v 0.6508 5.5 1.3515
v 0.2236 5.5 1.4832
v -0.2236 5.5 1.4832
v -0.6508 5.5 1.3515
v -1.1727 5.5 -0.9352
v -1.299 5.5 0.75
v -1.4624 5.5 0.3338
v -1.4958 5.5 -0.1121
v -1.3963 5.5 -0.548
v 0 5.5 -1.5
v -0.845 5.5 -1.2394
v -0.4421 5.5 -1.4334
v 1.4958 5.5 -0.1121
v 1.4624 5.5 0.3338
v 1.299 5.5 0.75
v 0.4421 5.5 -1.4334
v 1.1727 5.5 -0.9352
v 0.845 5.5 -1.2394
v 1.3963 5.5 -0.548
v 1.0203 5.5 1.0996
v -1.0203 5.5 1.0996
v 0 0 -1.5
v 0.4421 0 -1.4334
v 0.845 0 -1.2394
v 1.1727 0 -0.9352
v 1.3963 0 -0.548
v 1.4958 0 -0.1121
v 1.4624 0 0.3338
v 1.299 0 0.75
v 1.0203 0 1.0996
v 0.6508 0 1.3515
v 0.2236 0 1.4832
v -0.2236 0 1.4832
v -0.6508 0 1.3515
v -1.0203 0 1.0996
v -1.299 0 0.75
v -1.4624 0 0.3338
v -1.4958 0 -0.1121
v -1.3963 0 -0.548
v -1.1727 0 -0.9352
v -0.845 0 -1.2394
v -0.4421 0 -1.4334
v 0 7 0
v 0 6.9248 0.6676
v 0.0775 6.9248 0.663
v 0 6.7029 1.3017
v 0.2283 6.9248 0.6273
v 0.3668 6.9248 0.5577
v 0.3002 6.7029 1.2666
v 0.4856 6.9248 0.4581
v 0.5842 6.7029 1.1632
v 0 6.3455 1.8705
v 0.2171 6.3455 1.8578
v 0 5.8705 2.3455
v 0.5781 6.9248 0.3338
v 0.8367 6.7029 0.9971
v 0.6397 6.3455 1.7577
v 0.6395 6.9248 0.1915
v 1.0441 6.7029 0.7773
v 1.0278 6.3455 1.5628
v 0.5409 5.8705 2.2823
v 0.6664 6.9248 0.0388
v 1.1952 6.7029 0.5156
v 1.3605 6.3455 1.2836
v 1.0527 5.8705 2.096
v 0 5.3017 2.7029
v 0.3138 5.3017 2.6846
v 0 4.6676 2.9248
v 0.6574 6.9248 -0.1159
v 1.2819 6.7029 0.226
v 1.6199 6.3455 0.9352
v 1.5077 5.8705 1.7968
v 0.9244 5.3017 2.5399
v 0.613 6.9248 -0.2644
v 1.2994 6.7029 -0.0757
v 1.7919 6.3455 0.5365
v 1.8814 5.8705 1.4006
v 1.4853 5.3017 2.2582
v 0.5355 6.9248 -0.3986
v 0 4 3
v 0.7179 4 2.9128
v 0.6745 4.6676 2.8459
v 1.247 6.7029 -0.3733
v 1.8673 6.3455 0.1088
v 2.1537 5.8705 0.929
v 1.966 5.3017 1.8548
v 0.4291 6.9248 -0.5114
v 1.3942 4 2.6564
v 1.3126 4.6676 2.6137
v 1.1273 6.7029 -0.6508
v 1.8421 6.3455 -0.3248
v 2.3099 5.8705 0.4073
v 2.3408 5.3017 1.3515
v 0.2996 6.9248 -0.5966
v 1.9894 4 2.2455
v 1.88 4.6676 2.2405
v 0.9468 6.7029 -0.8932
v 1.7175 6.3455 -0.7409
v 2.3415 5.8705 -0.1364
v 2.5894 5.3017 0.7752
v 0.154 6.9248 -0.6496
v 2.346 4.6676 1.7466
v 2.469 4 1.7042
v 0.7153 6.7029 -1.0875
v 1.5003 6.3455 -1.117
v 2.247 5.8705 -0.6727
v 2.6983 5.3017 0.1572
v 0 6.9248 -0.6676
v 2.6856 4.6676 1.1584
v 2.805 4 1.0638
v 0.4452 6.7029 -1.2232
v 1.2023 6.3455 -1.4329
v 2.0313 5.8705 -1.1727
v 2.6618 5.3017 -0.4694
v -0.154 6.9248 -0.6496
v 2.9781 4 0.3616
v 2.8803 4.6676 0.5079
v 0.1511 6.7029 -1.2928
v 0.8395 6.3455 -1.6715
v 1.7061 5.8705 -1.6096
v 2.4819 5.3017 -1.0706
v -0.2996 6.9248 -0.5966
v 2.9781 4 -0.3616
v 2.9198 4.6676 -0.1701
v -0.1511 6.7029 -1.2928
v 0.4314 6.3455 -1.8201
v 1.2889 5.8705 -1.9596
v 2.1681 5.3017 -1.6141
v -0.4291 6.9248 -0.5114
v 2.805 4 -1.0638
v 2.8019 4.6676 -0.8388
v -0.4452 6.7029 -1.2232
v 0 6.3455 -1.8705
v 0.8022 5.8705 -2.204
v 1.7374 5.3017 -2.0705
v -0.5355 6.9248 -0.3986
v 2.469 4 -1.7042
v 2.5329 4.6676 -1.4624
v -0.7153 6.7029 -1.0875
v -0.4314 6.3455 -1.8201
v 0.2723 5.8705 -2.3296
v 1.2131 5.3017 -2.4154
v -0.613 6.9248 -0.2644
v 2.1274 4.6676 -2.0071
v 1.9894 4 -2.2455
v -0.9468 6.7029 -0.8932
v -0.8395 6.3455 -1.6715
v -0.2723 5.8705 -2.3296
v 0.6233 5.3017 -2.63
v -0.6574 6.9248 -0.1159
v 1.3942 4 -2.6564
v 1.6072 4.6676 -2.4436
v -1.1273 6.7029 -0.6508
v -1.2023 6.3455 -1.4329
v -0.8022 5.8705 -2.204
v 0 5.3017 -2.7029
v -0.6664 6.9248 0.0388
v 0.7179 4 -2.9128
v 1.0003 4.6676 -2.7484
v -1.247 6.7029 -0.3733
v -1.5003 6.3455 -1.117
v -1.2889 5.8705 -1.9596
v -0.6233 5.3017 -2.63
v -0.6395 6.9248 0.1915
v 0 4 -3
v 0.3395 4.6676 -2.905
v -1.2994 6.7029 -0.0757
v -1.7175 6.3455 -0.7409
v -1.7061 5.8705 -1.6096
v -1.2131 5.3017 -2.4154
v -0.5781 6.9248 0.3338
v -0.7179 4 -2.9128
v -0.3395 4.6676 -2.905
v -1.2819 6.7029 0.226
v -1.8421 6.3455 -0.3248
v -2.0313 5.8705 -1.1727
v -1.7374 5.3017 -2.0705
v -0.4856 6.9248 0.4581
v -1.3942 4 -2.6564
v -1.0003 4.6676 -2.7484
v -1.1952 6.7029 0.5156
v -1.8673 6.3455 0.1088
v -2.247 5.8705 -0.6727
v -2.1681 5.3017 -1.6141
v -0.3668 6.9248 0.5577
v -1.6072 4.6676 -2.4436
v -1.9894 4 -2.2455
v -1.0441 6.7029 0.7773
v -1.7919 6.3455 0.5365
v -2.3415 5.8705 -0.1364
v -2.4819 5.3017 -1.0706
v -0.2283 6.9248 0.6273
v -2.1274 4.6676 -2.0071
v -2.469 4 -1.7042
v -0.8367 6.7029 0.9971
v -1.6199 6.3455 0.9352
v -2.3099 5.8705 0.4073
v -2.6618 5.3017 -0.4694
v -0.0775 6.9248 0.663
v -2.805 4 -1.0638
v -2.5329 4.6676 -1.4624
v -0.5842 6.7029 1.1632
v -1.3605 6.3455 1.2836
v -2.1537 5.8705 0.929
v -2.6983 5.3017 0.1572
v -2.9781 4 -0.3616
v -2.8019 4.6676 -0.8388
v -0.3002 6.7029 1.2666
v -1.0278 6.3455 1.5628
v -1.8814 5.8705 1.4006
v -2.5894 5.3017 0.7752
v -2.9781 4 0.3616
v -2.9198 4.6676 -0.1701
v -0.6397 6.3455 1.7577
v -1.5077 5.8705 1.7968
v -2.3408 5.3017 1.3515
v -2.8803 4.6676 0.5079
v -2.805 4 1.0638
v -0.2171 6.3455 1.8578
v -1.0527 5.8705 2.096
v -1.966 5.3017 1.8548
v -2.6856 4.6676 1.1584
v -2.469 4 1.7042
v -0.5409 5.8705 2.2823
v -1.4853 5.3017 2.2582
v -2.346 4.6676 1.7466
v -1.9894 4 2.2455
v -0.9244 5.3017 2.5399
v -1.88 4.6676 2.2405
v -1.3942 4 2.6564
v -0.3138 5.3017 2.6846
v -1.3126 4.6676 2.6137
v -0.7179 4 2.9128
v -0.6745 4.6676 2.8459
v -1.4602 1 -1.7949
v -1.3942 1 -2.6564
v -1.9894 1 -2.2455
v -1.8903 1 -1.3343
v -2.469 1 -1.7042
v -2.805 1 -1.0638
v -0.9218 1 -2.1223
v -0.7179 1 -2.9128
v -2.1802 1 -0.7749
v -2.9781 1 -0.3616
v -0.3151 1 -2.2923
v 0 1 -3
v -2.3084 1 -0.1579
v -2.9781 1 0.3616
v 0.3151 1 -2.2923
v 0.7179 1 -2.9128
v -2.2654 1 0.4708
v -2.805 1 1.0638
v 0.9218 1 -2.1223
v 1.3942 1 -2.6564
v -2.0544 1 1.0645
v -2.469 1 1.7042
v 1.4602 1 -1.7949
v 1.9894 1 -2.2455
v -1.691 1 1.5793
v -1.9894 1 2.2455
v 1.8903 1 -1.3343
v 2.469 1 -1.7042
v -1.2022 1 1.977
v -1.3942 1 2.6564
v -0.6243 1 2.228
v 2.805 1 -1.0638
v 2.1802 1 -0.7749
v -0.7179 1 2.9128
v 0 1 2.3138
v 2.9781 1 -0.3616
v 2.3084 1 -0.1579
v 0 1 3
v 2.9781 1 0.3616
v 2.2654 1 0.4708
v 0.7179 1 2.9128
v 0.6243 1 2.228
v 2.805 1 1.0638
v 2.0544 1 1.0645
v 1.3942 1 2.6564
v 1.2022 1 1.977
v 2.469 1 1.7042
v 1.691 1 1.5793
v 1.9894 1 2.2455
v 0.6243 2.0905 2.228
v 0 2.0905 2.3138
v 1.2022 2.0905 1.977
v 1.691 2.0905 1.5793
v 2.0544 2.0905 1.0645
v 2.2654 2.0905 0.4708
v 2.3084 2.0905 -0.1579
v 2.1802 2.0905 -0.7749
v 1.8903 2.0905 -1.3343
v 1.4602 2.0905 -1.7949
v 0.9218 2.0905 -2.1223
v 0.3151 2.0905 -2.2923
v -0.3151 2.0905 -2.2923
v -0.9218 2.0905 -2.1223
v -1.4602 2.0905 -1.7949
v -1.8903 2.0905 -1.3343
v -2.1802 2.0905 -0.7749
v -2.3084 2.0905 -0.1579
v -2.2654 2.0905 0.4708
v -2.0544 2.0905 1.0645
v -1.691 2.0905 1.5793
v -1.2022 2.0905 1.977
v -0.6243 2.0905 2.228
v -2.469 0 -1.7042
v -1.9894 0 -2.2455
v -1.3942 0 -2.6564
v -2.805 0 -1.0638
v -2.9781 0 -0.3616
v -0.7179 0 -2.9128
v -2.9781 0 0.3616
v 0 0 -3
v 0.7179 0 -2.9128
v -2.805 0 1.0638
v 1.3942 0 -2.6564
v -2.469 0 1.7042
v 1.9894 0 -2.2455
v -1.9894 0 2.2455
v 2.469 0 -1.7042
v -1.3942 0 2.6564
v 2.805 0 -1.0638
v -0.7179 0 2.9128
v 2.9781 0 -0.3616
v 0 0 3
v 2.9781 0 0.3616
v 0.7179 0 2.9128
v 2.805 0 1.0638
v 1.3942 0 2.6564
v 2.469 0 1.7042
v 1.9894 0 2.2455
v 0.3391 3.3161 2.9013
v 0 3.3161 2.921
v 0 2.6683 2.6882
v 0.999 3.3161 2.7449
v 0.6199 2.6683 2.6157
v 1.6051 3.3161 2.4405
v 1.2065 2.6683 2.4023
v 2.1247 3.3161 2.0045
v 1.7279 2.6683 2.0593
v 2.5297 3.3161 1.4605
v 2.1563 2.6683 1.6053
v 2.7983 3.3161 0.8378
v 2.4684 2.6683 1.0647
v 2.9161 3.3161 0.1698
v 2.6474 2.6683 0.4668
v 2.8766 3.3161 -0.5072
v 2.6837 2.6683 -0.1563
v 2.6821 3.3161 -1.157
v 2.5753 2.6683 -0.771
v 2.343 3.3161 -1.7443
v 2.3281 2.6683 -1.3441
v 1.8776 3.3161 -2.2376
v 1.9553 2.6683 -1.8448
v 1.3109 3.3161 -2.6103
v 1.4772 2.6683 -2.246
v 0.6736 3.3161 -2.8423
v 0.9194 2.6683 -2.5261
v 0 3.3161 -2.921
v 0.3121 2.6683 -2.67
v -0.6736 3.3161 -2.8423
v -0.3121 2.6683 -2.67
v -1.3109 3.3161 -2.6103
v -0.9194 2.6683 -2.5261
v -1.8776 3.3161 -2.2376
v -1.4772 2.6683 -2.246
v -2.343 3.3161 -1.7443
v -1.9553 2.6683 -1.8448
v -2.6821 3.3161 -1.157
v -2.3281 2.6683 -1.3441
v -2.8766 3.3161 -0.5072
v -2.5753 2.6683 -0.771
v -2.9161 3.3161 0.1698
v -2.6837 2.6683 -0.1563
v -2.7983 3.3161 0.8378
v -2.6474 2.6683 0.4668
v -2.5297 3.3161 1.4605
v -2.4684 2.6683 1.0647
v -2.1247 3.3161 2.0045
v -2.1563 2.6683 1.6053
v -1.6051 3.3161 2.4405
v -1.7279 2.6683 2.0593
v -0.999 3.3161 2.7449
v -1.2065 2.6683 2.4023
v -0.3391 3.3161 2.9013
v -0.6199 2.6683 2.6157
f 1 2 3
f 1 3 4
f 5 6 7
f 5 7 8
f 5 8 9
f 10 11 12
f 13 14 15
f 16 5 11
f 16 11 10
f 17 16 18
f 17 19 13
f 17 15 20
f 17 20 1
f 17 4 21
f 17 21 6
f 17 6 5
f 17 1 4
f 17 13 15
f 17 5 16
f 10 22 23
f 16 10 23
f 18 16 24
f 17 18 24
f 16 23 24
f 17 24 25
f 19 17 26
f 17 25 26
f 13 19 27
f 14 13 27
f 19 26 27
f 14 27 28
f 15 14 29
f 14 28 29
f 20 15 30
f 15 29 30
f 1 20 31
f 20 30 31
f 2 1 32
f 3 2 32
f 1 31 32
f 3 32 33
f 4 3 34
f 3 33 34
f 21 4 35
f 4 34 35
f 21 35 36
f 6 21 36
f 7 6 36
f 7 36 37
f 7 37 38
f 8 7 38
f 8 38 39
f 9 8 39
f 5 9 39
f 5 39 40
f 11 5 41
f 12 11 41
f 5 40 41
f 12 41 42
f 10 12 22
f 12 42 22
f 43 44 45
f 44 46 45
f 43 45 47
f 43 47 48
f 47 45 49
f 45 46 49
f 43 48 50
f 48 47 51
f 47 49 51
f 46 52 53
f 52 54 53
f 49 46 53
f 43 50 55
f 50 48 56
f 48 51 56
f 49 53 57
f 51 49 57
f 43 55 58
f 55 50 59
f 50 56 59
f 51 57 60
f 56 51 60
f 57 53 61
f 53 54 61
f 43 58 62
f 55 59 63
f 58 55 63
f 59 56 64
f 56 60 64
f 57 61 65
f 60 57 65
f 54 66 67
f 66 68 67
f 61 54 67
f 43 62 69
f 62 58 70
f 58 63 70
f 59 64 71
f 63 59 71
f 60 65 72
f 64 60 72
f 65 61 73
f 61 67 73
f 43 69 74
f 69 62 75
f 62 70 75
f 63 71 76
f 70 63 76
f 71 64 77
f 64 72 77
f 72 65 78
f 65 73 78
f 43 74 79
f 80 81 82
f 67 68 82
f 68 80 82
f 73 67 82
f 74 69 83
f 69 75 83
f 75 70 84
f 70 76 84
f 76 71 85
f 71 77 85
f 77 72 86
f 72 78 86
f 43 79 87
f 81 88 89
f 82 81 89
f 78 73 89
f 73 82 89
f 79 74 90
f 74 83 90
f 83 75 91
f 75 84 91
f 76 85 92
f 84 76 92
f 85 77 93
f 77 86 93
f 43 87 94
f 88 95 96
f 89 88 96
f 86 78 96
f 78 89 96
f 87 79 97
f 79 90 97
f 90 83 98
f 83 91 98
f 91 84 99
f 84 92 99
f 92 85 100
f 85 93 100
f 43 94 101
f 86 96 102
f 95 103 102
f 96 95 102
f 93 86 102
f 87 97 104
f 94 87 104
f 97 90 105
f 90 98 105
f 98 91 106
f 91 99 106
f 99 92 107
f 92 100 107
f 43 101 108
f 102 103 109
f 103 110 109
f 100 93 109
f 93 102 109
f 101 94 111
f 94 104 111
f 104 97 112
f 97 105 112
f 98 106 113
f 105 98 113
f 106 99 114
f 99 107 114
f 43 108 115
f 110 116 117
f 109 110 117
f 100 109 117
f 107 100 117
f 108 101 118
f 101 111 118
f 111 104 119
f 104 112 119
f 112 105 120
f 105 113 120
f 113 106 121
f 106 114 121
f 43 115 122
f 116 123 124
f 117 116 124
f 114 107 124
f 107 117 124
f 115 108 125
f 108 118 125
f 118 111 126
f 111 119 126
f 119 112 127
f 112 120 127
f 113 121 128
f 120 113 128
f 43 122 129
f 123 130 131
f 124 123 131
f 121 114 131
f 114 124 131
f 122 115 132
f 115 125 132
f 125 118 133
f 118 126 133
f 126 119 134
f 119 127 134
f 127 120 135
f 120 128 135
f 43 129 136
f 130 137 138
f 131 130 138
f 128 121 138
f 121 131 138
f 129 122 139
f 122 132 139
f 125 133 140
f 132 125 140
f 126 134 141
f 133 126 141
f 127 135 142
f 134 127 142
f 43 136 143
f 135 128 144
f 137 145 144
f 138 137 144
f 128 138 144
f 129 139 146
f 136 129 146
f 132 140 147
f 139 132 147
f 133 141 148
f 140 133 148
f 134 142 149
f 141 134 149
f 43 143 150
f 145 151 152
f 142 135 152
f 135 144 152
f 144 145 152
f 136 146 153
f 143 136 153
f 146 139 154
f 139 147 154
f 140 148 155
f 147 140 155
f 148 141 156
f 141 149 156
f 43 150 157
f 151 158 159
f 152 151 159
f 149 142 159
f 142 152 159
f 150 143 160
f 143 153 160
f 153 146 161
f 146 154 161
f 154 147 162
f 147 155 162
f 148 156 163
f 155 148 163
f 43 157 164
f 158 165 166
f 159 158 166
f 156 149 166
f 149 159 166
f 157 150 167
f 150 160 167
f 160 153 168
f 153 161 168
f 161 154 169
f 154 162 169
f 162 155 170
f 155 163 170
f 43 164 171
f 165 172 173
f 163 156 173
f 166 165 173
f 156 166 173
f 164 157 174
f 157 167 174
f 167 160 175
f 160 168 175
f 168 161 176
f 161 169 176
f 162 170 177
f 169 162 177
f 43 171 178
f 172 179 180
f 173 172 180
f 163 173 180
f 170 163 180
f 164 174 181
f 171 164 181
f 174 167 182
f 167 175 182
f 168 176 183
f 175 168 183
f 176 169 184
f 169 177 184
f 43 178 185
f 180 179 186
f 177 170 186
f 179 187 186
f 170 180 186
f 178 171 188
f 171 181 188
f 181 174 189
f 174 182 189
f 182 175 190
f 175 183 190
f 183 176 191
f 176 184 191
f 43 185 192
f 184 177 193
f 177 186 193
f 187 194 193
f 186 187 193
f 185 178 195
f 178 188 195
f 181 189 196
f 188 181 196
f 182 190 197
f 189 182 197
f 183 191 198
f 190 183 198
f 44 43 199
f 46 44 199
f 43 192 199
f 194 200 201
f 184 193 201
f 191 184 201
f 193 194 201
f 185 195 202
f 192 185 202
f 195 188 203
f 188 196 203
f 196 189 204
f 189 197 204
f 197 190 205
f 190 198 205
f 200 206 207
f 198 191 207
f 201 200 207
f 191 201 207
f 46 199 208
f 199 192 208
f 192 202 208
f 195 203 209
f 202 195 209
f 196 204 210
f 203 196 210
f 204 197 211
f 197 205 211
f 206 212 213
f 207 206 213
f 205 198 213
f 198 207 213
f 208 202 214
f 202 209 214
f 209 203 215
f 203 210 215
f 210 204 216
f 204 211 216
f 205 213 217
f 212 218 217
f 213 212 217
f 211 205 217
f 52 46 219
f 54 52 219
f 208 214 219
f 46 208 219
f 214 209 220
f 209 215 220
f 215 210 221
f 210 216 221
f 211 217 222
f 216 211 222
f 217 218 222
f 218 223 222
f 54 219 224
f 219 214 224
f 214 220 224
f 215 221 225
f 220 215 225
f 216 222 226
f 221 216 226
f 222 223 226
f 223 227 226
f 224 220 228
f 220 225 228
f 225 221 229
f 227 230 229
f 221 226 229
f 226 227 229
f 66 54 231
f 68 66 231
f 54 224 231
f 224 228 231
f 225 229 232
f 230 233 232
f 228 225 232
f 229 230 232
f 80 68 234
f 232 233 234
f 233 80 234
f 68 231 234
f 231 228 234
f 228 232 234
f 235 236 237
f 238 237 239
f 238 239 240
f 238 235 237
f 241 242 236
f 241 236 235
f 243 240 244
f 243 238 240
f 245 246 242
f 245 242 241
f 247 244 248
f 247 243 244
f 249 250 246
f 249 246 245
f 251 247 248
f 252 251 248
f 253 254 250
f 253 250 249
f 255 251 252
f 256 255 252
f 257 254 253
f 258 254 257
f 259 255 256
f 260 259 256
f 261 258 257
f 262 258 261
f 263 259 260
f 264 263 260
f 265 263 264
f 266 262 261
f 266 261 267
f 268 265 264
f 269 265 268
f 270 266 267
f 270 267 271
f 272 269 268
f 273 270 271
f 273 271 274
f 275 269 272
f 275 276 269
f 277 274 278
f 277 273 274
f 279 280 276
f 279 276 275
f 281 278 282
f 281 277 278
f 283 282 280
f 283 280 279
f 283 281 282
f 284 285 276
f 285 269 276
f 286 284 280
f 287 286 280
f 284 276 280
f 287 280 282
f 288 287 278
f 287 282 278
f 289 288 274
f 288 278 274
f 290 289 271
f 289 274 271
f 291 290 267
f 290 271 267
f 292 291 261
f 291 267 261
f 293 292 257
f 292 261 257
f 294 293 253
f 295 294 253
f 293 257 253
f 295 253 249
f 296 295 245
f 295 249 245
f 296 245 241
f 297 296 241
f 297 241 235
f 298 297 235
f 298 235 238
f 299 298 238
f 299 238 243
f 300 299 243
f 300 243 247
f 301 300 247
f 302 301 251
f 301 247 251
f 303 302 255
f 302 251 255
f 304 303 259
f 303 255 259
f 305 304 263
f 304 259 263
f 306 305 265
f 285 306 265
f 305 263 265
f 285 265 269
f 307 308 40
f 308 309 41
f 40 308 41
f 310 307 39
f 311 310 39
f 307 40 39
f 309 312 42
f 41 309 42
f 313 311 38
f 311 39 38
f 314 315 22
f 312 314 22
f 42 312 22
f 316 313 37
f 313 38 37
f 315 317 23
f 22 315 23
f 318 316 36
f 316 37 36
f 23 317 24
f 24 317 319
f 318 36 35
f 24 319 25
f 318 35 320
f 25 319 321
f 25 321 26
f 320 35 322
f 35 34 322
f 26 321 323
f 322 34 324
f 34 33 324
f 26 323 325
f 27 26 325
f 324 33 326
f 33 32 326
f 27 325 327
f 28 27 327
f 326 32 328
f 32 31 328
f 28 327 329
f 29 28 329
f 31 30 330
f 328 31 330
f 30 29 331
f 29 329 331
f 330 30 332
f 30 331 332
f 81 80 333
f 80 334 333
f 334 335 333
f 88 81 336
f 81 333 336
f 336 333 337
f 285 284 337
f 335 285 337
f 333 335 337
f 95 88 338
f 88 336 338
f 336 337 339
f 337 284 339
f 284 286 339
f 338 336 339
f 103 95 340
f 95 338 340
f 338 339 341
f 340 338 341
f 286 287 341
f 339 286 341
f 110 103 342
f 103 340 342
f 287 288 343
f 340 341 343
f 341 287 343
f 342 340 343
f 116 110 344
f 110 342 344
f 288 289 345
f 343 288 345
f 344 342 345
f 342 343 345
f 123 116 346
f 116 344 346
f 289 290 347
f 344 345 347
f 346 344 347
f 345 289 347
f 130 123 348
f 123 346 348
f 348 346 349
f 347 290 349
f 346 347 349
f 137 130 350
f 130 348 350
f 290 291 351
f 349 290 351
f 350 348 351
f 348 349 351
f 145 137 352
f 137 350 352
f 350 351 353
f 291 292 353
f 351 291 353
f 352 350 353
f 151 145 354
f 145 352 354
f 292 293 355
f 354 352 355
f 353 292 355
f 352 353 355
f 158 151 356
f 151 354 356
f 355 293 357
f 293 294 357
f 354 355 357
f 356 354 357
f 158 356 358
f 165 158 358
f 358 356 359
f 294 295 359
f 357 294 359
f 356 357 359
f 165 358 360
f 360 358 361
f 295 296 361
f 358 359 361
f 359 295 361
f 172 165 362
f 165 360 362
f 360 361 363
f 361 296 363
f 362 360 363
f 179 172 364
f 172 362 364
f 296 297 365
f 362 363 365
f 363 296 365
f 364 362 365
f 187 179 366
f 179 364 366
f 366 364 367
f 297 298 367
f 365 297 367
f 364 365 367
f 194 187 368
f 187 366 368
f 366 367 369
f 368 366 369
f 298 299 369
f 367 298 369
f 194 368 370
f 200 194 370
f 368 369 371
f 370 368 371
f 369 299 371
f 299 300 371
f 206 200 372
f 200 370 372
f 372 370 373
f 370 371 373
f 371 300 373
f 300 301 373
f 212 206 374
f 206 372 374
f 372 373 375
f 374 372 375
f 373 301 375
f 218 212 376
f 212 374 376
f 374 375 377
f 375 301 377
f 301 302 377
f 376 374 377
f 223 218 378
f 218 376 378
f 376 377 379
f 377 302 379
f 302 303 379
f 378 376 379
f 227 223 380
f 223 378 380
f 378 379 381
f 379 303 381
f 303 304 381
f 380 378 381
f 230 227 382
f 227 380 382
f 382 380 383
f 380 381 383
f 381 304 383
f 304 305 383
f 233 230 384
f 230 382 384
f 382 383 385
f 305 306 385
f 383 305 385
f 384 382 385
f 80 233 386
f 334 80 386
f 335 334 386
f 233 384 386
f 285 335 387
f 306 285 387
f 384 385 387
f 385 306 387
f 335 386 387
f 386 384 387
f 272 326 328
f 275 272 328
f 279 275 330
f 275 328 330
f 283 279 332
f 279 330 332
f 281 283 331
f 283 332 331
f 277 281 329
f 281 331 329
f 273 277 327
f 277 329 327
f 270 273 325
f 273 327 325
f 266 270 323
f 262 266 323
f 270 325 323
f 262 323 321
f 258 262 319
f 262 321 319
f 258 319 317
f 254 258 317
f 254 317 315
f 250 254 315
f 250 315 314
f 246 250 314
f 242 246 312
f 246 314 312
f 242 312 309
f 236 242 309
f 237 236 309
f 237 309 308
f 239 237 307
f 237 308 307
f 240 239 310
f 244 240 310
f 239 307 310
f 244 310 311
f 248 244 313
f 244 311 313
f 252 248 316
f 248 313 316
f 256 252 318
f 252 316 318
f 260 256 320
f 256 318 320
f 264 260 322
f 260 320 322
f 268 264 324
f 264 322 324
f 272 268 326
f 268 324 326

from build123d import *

# Parameters (mm, degrees)
SKETCH1_R           = 3
BOSS_EXTRUDE1_DEPTH = 1
SKETCH4_R           = 1.5
CUT_EXTRUDE1_DEPTH  = 5.5


with BuildPart() as part:
    # Sketch1 → Boss-Extrude1 (new body)
    with BuildSketch(Plane(origin=(0, 0, 0), x_dir=(1, 0, 0), z_dir=(0, 1, 0))):
        with Locations(Location((0, 0, 0), (0, 0, 270))):
            Circle(SKETCH1_R)
    extrude(amount=BOSS_EXTRUDE1_DEPTH)

    # Sketch3 → Revolve2 (revolve)
    with BuildSketch(Plane(origin=(0, 0, 0), x_dir=(0, 0, -1), z_dir=(1, 0, 0))):
        with BuildLine():
            Line((-1.156919819, 1), (0, 1))
            Line((0, 1), (0, 4))
            Line((0, 4), (0, 7))
            ThreePointArc((0, 7), (-2.121320344, 6.121320344), (-3, 4))
            ThreePointArc((-3, 4), (-2.823253346, 2.98548507), (-2.313839638, 2.090511553))
            Line((-2.313839638, 2.090511553), (-2.313839638, 1))
            Line((-2.313839638, 1), (-1.156919819, 1))
        make_face()
    revolve(axis=Axis((0, 4, 0), (0, 1, 0)))

    # Sketch4 → Cut-Extrude1 (cut)
    with BuildSketch(Plane.XZ):
        with Locations(Location((0, 0, 0), (0, 0, 270))):
            Circle(SKETCH4_R)
    extrude(amount=-CUT_EXTRUDE1_DEPTH, mode=Mode.SUBTRACT)


solid = part.part
